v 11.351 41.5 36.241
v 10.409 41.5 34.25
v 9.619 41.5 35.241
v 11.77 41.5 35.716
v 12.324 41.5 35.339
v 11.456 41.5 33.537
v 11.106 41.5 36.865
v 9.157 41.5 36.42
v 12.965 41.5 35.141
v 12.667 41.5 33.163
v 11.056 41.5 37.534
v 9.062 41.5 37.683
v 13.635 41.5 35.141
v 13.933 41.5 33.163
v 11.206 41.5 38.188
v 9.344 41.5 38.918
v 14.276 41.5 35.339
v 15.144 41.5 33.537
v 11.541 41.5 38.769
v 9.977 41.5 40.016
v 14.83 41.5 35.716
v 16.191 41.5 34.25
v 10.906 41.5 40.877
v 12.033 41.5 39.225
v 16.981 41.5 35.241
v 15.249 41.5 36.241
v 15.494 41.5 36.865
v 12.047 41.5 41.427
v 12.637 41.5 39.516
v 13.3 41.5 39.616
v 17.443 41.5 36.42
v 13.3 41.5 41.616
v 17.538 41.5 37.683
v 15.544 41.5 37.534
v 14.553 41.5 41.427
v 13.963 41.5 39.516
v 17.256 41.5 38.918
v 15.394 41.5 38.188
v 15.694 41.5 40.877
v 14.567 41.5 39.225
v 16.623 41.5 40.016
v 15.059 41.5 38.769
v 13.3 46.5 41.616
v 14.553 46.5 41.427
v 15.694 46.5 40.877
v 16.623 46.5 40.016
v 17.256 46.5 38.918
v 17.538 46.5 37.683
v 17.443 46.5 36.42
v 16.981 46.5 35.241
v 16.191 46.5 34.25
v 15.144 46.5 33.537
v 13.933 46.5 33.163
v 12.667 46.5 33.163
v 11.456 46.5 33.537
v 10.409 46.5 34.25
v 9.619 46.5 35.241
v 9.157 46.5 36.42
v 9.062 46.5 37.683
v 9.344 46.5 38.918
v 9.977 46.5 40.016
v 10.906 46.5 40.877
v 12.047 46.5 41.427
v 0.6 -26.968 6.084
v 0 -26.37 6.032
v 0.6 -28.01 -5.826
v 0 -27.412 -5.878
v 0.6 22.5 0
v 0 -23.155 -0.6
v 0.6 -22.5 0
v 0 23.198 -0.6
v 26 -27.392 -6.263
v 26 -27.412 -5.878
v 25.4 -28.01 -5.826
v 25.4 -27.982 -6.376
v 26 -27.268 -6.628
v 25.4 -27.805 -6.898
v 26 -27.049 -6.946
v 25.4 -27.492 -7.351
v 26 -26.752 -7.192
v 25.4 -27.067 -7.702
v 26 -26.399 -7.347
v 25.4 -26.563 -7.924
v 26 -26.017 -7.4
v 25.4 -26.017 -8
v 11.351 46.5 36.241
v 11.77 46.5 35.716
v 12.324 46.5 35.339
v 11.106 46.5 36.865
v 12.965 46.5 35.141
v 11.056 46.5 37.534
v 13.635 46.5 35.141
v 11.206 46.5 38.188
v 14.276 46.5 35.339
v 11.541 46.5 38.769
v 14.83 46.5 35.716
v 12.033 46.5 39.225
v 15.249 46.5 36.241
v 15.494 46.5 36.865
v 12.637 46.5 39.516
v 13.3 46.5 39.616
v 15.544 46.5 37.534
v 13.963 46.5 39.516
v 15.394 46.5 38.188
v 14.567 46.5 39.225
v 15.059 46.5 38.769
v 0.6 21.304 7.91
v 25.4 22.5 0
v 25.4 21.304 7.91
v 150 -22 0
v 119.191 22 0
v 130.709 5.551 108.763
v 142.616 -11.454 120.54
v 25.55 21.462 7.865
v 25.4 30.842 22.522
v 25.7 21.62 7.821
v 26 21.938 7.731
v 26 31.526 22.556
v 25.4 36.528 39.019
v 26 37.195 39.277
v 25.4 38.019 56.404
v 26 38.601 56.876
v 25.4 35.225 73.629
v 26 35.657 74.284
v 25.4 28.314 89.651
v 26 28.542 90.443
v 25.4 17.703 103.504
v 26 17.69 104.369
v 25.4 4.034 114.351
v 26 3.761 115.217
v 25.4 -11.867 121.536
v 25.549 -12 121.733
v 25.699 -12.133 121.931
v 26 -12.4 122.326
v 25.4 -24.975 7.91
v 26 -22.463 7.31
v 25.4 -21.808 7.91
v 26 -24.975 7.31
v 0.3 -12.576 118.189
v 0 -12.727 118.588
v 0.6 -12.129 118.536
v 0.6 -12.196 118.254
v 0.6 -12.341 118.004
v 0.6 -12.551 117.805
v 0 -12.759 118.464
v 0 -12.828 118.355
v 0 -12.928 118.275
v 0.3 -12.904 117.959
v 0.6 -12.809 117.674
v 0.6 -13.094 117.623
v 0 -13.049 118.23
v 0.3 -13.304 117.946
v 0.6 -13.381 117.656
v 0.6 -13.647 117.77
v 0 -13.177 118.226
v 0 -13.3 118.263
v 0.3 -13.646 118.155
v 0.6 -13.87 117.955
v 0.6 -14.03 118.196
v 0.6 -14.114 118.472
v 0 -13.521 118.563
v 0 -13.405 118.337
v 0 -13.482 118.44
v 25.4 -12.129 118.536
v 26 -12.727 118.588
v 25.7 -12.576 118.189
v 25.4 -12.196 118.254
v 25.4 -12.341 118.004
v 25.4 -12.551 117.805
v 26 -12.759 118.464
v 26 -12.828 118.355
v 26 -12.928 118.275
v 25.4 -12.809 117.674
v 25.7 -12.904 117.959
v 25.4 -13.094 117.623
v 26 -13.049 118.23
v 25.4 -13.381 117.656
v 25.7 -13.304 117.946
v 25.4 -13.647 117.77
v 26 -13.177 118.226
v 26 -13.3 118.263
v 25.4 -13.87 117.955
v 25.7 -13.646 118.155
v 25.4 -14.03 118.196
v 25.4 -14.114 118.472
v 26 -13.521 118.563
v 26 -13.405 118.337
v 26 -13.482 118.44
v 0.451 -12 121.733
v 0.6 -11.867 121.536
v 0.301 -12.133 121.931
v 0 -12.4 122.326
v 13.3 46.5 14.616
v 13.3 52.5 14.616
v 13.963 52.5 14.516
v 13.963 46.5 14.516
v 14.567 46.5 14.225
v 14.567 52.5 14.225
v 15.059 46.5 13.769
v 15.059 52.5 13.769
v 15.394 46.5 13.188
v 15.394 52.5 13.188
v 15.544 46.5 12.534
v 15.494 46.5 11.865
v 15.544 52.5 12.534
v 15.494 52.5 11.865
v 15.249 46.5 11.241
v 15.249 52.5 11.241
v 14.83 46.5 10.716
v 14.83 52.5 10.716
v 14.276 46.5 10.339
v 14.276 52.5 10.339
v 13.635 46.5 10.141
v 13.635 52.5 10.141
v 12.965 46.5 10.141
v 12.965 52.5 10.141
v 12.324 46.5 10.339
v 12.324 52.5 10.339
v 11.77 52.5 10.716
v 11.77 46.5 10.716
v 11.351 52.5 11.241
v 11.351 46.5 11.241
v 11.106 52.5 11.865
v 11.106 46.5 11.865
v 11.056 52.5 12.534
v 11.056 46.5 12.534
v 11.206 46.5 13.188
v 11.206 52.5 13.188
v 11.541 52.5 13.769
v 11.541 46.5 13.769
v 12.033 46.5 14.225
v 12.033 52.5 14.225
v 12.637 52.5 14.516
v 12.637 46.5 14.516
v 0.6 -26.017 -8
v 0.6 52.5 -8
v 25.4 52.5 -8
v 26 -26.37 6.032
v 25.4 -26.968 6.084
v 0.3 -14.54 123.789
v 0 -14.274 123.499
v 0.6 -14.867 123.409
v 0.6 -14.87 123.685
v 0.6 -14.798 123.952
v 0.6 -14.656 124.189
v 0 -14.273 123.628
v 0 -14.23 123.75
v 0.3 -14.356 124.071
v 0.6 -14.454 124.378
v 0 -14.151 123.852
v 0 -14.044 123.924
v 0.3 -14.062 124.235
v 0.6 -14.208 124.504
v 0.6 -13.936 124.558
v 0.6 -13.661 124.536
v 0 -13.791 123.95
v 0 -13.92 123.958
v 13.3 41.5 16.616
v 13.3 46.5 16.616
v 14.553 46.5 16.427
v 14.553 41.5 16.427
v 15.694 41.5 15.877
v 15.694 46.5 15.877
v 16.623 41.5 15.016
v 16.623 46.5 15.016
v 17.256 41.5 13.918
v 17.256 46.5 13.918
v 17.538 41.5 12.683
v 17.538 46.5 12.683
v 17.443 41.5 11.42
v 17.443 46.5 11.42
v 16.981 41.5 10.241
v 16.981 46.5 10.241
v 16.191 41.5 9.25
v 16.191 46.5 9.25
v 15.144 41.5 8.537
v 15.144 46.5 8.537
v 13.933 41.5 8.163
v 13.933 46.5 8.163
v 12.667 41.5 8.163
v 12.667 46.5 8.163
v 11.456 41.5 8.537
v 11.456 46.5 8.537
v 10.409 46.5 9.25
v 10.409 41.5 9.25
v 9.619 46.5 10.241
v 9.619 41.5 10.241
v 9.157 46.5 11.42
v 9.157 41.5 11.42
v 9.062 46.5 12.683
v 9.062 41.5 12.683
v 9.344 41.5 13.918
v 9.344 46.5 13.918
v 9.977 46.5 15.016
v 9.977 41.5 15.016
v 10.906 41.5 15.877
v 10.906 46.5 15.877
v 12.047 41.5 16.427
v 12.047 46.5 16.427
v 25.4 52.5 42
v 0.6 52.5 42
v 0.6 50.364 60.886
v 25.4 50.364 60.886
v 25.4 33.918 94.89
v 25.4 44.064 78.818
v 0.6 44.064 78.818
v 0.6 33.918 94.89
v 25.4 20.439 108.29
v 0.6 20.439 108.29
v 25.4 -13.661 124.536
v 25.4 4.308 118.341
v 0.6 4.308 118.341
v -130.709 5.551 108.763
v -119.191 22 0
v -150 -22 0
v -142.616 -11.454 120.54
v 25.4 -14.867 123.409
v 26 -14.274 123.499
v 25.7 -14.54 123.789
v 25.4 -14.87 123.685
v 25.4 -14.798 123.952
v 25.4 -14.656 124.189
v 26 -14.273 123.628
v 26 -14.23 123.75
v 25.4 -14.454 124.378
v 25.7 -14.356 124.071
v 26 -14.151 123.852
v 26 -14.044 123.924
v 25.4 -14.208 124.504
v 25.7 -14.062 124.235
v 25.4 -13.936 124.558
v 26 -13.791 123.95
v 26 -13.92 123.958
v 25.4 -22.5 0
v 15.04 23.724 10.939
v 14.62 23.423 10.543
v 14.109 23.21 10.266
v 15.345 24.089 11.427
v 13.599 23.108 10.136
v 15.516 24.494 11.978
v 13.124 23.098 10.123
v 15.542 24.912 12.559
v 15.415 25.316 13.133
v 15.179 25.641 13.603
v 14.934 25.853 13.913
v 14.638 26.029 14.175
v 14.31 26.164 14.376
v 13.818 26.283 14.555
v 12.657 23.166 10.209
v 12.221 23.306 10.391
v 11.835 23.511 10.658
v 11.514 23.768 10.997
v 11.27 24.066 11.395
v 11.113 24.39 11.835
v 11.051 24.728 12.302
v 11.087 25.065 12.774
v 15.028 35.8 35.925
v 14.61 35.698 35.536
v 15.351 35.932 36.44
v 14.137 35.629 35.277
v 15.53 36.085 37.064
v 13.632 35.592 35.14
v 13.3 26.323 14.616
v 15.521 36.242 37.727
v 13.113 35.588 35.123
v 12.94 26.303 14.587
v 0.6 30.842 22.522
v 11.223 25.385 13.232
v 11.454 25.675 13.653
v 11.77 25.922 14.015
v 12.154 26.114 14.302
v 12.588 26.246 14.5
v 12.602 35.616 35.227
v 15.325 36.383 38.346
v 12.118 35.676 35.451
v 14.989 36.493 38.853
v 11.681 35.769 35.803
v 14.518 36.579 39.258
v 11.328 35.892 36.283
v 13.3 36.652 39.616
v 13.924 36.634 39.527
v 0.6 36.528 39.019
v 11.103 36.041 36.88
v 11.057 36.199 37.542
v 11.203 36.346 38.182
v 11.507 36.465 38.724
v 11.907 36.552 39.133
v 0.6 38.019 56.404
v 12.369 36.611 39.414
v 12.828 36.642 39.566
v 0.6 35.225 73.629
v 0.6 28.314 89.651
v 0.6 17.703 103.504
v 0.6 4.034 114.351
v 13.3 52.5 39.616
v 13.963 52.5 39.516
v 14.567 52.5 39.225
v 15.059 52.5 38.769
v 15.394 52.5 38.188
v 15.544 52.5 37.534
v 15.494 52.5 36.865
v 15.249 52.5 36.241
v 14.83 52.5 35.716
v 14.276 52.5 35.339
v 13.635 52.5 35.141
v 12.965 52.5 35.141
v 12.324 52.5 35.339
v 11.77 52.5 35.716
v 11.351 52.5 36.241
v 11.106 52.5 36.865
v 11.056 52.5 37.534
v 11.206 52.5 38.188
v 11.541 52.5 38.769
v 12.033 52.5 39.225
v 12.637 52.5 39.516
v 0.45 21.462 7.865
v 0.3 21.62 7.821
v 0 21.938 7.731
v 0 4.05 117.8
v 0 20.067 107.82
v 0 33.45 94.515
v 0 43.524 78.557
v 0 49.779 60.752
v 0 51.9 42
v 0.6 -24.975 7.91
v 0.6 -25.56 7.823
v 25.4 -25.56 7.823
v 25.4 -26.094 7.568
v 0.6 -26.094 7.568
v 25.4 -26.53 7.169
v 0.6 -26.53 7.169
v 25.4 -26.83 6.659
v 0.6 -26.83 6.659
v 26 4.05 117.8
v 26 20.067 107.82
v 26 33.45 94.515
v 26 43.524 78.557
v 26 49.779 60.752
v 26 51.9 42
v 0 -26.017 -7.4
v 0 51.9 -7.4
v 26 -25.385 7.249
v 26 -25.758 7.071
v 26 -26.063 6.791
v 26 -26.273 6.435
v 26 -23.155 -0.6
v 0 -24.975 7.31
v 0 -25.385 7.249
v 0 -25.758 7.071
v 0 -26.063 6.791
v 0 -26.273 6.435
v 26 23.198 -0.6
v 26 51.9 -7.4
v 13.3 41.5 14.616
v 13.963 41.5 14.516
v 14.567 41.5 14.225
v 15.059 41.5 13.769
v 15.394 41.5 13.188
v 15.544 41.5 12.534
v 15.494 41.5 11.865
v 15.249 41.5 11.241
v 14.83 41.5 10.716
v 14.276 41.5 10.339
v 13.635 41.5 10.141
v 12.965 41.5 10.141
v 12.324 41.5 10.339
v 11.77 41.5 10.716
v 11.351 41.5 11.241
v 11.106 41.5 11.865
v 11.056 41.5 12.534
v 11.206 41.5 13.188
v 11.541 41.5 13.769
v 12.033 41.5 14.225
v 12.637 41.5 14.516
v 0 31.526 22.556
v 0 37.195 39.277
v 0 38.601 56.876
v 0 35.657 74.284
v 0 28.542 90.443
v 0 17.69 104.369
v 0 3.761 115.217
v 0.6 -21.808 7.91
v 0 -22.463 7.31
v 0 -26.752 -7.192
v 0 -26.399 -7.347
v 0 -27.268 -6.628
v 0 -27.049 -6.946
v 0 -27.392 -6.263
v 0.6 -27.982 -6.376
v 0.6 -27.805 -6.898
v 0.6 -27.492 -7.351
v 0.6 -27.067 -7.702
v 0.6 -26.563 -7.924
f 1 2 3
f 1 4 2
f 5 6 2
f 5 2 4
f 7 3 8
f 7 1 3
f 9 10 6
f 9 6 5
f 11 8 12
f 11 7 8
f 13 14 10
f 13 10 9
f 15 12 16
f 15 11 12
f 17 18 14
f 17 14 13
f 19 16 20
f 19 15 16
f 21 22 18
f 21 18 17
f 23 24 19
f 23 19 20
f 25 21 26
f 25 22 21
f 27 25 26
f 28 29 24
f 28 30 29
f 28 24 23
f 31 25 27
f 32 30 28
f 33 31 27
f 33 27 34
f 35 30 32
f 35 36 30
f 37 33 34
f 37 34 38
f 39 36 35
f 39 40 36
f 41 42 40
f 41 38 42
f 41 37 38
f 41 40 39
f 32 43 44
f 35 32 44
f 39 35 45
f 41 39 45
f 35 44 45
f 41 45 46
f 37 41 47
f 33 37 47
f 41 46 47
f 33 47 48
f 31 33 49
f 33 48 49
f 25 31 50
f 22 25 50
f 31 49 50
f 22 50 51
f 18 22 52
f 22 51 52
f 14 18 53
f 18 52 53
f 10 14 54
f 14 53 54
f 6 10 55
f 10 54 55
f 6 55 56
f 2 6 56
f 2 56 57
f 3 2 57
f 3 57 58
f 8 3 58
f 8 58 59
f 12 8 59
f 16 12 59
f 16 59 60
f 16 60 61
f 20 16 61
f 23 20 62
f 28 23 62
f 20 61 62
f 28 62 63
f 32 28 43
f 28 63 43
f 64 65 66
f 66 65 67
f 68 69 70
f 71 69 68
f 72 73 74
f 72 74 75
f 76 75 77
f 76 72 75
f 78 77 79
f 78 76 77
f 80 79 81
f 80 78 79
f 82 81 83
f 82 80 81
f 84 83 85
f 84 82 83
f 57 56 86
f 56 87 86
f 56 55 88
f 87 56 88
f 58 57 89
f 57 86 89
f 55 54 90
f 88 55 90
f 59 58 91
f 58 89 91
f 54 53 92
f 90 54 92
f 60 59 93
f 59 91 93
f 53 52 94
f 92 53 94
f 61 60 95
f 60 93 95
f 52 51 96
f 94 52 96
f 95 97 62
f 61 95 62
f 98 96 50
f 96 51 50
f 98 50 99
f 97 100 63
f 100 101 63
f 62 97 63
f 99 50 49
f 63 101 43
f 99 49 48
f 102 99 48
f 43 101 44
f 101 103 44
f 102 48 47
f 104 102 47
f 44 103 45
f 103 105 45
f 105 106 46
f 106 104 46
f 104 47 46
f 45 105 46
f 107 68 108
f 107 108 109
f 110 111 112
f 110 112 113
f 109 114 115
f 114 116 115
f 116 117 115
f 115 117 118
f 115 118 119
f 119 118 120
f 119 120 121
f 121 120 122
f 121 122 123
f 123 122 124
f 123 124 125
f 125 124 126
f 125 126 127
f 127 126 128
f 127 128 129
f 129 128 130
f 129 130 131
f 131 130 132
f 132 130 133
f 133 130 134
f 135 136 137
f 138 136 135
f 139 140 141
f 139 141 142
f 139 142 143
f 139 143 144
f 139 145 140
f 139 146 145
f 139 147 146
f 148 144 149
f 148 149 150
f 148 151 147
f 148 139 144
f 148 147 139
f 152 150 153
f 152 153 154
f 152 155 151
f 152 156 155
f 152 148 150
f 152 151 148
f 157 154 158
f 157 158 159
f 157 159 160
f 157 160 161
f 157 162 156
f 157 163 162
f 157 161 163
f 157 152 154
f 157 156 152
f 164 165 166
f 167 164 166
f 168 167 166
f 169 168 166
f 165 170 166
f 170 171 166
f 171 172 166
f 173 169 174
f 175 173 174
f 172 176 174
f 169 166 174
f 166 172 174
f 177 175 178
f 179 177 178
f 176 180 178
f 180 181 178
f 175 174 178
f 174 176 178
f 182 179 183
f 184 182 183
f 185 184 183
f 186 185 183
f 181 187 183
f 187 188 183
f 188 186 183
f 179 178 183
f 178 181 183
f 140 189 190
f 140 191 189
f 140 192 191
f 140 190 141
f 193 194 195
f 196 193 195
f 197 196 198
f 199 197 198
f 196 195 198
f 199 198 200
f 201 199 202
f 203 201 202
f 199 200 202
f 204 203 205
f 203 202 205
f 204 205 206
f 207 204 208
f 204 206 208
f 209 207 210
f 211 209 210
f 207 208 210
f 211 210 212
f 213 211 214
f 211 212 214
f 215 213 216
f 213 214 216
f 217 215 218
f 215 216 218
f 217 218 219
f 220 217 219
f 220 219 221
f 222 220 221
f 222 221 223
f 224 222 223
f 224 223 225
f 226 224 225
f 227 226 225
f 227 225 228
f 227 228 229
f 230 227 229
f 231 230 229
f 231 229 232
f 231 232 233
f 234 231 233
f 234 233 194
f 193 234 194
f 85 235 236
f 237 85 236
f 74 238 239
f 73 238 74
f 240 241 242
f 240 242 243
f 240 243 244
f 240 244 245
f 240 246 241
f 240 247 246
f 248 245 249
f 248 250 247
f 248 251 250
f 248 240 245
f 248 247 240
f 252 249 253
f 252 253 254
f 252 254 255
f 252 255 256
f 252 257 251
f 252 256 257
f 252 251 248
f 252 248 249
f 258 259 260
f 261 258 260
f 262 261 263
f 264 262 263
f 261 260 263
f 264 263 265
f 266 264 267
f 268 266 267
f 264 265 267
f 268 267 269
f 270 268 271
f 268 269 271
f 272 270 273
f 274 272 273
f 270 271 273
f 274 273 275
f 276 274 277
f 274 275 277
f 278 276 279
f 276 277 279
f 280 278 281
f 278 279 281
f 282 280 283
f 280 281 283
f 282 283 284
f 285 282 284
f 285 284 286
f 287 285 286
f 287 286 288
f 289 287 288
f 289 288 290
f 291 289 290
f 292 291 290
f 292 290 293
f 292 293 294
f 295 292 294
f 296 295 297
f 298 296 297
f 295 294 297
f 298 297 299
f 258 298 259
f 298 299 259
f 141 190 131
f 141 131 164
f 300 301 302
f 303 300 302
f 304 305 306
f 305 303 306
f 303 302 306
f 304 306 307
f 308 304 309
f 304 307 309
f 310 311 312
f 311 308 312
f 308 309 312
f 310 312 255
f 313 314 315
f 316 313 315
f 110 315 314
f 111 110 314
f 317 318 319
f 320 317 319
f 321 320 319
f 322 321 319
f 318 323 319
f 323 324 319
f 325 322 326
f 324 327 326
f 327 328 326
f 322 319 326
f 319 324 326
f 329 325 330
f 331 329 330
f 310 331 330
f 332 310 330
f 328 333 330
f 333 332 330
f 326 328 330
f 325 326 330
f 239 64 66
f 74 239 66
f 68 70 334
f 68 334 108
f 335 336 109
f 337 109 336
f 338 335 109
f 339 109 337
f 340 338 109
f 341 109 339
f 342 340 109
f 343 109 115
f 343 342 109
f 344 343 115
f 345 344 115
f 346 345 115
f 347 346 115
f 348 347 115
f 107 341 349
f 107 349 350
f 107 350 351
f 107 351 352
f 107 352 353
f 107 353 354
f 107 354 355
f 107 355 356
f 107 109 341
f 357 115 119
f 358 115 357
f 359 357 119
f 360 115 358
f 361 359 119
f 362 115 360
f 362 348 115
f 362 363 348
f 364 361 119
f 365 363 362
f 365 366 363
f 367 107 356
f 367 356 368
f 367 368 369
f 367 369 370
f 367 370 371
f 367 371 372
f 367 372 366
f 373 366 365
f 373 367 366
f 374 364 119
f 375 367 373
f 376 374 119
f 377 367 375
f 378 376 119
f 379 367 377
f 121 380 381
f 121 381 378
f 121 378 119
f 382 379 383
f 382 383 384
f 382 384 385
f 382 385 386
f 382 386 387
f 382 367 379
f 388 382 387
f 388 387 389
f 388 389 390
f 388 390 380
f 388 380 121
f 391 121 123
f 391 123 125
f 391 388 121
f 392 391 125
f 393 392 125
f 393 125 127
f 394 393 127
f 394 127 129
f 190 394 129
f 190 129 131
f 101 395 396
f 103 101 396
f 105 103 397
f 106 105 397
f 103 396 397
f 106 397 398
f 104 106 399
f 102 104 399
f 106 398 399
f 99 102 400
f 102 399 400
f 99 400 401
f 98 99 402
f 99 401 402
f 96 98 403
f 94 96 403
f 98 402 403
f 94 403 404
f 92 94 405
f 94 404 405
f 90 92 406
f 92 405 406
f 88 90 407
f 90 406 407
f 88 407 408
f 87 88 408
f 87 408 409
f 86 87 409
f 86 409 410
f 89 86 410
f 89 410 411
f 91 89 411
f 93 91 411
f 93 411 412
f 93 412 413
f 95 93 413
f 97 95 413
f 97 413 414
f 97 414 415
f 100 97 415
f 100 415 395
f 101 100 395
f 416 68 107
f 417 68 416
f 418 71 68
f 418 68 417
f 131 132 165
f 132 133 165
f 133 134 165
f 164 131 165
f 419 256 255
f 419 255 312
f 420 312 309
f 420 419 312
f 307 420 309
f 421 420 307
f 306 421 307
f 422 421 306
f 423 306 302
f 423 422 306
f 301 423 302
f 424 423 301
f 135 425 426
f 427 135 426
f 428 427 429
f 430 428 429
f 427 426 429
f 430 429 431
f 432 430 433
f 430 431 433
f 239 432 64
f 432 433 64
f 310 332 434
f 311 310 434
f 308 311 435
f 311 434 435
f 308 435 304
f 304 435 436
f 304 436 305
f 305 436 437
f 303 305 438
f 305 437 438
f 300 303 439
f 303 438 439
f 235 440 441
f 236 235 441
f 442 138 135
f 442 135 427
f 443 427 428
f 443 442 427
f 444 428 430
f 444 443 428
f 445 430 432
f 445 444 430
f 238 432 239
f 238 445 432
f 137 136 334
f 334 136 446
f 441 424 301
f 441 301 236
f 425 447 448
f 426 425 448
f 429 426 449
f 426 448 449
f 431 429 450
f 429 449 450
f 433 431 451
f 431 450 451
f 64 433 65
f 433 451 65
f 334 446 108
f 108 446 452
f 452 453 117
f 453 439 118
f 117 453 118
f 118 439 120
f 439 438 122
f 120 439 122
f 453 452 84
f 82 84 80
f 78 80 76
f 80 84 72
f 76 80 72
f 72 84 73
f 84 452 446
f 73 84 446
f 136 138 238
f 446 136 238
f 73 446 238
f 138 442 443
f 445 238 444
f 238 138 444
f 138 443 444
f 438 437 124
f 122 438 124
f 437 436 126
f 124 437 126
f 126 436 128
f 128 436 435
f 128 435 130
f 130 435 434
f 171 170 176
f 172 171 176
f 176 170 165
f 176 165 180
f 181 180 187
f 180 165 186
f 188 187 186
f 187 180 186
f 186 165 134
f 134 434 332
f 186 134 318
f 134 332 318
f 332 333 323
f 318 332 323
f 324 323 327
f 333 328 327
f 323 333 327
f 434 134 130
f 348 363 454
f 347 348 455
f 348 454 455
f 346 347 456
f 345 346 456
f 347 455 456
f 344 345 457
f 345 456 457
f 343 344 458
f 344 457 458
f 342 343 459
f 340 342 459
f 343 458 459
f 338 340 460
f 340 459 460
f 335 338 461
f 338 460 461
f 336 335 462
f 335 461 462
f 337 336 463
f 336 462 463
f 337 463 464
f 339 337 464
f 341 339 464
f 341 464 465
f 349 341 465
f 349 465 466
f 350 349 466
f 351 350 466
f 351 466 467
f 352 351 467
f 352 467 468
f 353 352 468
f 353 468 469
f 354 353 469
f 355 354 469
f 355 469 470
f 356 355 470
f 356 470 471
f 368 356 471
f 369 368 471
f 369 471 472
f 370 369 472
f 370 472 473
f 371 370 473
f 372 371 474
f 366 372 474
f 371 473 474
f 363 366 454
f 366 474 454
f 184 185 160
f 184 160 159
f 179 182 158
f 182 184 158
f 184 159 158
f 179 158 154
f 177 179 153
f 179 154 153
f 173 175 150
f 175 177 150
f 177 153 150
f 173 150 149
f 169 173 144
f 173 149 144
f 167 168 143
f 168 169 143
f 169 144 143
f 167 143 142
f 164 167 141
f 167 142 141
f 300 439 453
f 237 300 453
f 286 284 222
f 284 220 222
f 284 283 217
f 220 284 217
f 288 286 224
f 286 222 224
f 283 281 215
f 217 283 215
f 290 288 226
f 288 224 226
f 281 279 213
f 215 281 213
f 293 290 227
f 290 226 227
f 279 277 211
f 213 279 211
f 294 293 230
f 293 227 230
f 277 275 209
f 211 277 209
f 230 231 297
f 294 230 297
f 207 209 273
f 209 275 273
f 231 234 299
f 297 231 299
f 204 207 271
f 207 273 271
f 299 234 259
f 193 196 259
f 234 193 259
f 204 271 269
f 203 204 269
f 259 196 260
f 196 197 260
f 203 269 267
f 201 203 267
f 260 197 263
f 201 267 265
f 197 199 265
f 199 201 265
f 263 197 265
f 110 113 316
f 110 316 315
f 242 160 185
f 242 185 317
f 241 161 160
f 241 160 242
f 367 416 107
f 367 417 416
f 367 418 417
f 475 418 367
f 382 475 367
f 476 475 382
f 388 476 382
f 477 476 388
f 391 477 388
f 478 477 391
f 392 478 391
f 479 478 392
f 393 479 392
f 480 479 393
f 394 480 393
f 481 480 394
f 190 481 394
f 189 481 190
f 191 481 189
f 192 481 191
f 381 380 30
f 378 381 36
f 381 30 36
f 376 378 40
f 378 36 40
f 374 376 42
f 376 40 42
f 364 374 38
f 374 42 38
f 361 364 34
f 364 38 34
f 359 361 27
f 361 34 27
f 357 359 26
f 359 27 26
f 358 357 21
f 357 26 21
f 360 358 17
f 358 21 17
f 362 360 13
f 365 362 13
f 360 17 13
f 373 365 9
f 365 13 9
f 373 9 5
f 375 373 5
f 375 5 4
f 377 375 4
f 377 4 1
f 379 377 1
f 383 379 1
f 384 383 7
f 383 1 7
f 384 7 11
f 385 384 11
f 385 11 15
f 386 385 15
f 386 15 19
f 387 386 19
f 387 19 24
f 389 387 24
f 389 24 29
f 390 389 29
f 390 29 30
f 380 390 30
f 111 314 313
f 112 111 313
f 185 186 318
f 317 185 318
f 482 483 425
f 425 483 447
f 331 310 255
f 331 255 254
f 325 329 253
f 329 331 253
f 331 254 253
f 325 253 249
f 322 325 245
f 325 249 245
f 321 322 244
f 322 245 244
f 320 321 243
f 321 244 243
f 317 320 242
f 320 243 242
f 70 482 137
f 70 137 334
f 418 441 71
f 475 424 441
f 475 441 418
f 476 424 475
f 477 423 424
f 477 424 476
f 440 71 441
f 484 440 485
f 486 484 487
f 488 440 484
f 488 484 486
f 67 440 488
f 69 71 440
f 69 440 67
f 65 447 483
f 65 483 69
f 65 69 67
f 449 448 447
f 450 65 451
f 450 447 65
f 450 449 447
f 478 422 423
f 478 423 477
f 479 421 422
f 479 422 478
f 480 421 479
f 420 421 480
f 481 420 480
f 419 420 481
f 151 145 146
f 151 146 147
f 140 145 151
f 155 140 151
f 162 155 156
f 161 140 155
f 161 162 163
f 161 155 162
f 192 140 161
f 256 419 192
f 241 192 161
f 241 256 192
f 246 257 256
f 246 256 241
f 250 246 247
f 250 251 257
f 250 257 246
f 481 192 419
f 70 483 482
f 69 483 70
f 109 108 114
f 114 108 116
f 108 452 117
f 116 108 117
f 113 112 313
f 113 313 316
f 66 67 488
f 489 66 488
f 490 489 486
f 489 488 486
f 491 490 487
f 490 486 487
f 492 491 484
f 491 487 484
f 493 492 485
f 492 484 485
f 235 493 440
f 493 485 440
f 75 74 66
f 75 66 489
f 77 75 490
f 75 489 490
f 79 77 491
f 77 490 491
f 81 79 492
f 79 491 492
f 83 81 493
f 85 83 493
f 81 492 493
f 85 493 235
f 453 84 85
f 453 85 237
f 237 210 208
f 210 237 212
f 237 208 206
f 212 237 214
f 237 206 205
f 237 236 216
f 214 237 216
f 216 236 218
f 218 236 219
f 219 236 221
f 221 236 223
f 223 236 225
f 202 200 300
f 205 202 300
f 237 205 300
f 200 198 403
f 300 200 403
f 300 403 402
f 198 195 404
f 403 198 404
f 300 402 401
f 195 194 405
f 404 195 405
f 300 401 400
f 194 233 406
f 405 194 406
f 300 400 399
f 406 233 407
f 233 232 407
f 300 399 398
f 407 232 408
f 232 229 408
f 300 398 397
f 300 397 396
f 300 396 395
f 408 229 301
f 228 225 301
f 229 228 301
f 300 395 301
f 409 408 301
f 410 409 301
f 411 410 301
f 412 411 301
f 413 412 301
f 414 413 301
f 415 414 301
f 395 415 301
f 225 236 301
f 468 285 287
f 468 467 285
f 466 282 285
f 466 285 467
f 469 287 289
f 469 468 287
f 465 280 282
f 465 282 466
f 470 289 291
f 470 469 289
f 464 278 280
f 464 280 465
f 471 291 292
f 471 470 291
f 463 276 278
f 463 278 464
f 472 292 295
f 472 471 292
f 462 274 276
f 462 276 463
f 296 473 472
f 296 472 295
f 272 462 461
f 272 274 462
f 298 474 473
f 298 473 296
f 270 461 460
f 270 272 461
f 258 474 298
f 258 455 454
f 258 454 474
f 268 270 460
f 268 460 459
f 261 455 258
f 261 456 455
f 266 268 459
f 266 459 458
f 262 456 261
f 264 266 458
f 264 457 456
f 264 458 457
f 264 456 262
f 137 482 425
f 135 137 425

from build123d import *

# Parameters (mm, degrees)
PAD_DEPTH       = 150
POCKET_DEPTH    = 773.122462
PAD002_DEPTH    = 26
CHAMFER001_SIZE = 0.6
SKETCH008_R     = 2.25
POCKET003_DEPTH = 80.518292
SKETCH009_R     = 4.25
POCKET004_DEPTH = 5


with BuildPart() as starlink_gen3_router_proxy:
    # Sketch → Pad (new body, symmetric)
    with BuildSketch(Plane.YZ):
        Polygon((-22, 0), (22, 0), (5.551112, 108.763202), (-11.454155, 120.539558), align=None)
    extrude(amount=PAD_DEPTH, both=True)

    # Sketch001 → Pocket (cut, through all)
    with BuildSketch(Plane.XY):
        Polygon((150, -22), (150, 38), (107.987548, 38), align=None)
    pocket = extrude(amount=POCKET_DEPTH, mode=Mode.SUBTRACT)

    # Mirrored: Pocket across Sketch001 V_Axis
    add(pocket.mirror(Plane(origin=(0, 0, 0), x_dir=(0, 0, 1), z_dir=(1, 0, 0))), mode=Mode.SUBTRACT)


with BuildPart() as router_mount:
    # Sketch007 → Pad002 (new body)
    with BuildSketch(Plane.YZ):
        with BuildLine():
            ThreePointArc((21.303717, 7.910051), (35.224788, 73.628635), (-11.866999, 121.535753))
            Line((-11.866999, 121.535753), (-12.129465, 118.535753))
            ThreePointArc((-14.114234, 118.472171), (-13.093641, 117.623422), (-12.129465, 118.535753))
            Line((-14.114234, 118.472171), (-14.866999, 123.408979))
            ThreePointArc((-13.660818, 124.535753), (-14.561069, 124.290468), (-14.866999, 123.408979))
            ThreePointArc((52.5, 42), (33.918201, 94.889991), (-13.660818, 124.535753))
            Line((52.5, -8), (52.5, 42))
            Line((-26.017292, -8), (52.5, -8))
            ThreePointArc((-28.009682, -5.825689), (-27.491847, -7.35118), (-26.017292, -8))
            Line((-26.967687, 6.084363), (-28.009682, -5.825689))
            ThreePointArc((-24.975298, 7.910051), (-26.326478, 7.384606), (-26.967687, 6.084363))
            Line((-21.80796, 7.910051), (-24.975298, 7.910051))
            Line((-21.80796, 7.910051), (-22.5, 0))
            Line((-22.5, 0), (22.5, 0))
            Line((22.5, 0), (21.303717, 7.910051))
        make_face()
    extrude(amount=PAD002_DEPTH)

    # Chamfer001
    chamfer001_edges = [router_mount.edges().sort_by_distance(p)[0] for p in [
        (26, -22.15398, 3.955026),
        (26, 0, 0),
        (26, 21.901859, 3.955026),
        (26, 35.224788, 73.628635),
        (26, -11.998232, 120.035753),
        (26, -13.093641, 117.623422),
        (26, -14.490617, 120.940575),
        (26, -14.561069, 124.290468),
        (26, 33.918201, 94.889991),
        (26, 52.5, 17),
        (26, 13.241354, -8),
        (26, -27.491847, -7.35118),
        (26, -27.488684, 0.129337),
        (26, -26.326478, 7.384606),
        (26, -23.391629, 7.910051),
        (0, -22.15398, 3.955026),
        (0, 0, 0),
        (0, 21.901859, 3.955026),
        (0, 35.224788, 73.628635),
        (0, -11.998232, 120.035753),
        (0, -13.093641, 117.623422),
        (0, -14.490617, 120.940575),
        (0, -14.561069, 124.290468),
        (0, 33.918201, 94.889991),
        (0, 52.5, 17),
        (0, 13.241354, -8),
        (0, -27.491847, -7.35118),
        (0, -27.488684, 0.129337),
        (0, -26.326478, 7.384606),
        (0, -23.391629, 7.910051),
    ]]
    chamfer(chamfer001_edges, length=CHAMFER001_SIZE)

    # Sketch008 (on Face44 of Chamfer001) → Pocket003 (cut, through all)
    with BuildSketch(Plane.ZX.offset(52.5)):
        with Locations((37.365689, 13.3)):
            Circle(SKETCH008_R)
        with Locations((12.365689, 13.3)):
            Circle(SKETCH008_R)
    extrude(amount=-POCKET003_DEPTH, mode=Mode.SUBTRACT)

    # Sketch009 (on Face44 of Pocket003) → Pocket004 (cut)
    with BuildSketch(Plane.ZX.offset(46.5)):
        with Locations((12.365689, 13.3)):
            Circle(SKETCH009_R)
        with Locations((37.365689, 13.3)):
            Circle(SKETCH009_R)
    extrude(amount=-POCKET004_DEPTH, mode=Mode.SUBTRACT)


solid = Compound([starlink_gen3_router_proxy.part, router_mount.part])
